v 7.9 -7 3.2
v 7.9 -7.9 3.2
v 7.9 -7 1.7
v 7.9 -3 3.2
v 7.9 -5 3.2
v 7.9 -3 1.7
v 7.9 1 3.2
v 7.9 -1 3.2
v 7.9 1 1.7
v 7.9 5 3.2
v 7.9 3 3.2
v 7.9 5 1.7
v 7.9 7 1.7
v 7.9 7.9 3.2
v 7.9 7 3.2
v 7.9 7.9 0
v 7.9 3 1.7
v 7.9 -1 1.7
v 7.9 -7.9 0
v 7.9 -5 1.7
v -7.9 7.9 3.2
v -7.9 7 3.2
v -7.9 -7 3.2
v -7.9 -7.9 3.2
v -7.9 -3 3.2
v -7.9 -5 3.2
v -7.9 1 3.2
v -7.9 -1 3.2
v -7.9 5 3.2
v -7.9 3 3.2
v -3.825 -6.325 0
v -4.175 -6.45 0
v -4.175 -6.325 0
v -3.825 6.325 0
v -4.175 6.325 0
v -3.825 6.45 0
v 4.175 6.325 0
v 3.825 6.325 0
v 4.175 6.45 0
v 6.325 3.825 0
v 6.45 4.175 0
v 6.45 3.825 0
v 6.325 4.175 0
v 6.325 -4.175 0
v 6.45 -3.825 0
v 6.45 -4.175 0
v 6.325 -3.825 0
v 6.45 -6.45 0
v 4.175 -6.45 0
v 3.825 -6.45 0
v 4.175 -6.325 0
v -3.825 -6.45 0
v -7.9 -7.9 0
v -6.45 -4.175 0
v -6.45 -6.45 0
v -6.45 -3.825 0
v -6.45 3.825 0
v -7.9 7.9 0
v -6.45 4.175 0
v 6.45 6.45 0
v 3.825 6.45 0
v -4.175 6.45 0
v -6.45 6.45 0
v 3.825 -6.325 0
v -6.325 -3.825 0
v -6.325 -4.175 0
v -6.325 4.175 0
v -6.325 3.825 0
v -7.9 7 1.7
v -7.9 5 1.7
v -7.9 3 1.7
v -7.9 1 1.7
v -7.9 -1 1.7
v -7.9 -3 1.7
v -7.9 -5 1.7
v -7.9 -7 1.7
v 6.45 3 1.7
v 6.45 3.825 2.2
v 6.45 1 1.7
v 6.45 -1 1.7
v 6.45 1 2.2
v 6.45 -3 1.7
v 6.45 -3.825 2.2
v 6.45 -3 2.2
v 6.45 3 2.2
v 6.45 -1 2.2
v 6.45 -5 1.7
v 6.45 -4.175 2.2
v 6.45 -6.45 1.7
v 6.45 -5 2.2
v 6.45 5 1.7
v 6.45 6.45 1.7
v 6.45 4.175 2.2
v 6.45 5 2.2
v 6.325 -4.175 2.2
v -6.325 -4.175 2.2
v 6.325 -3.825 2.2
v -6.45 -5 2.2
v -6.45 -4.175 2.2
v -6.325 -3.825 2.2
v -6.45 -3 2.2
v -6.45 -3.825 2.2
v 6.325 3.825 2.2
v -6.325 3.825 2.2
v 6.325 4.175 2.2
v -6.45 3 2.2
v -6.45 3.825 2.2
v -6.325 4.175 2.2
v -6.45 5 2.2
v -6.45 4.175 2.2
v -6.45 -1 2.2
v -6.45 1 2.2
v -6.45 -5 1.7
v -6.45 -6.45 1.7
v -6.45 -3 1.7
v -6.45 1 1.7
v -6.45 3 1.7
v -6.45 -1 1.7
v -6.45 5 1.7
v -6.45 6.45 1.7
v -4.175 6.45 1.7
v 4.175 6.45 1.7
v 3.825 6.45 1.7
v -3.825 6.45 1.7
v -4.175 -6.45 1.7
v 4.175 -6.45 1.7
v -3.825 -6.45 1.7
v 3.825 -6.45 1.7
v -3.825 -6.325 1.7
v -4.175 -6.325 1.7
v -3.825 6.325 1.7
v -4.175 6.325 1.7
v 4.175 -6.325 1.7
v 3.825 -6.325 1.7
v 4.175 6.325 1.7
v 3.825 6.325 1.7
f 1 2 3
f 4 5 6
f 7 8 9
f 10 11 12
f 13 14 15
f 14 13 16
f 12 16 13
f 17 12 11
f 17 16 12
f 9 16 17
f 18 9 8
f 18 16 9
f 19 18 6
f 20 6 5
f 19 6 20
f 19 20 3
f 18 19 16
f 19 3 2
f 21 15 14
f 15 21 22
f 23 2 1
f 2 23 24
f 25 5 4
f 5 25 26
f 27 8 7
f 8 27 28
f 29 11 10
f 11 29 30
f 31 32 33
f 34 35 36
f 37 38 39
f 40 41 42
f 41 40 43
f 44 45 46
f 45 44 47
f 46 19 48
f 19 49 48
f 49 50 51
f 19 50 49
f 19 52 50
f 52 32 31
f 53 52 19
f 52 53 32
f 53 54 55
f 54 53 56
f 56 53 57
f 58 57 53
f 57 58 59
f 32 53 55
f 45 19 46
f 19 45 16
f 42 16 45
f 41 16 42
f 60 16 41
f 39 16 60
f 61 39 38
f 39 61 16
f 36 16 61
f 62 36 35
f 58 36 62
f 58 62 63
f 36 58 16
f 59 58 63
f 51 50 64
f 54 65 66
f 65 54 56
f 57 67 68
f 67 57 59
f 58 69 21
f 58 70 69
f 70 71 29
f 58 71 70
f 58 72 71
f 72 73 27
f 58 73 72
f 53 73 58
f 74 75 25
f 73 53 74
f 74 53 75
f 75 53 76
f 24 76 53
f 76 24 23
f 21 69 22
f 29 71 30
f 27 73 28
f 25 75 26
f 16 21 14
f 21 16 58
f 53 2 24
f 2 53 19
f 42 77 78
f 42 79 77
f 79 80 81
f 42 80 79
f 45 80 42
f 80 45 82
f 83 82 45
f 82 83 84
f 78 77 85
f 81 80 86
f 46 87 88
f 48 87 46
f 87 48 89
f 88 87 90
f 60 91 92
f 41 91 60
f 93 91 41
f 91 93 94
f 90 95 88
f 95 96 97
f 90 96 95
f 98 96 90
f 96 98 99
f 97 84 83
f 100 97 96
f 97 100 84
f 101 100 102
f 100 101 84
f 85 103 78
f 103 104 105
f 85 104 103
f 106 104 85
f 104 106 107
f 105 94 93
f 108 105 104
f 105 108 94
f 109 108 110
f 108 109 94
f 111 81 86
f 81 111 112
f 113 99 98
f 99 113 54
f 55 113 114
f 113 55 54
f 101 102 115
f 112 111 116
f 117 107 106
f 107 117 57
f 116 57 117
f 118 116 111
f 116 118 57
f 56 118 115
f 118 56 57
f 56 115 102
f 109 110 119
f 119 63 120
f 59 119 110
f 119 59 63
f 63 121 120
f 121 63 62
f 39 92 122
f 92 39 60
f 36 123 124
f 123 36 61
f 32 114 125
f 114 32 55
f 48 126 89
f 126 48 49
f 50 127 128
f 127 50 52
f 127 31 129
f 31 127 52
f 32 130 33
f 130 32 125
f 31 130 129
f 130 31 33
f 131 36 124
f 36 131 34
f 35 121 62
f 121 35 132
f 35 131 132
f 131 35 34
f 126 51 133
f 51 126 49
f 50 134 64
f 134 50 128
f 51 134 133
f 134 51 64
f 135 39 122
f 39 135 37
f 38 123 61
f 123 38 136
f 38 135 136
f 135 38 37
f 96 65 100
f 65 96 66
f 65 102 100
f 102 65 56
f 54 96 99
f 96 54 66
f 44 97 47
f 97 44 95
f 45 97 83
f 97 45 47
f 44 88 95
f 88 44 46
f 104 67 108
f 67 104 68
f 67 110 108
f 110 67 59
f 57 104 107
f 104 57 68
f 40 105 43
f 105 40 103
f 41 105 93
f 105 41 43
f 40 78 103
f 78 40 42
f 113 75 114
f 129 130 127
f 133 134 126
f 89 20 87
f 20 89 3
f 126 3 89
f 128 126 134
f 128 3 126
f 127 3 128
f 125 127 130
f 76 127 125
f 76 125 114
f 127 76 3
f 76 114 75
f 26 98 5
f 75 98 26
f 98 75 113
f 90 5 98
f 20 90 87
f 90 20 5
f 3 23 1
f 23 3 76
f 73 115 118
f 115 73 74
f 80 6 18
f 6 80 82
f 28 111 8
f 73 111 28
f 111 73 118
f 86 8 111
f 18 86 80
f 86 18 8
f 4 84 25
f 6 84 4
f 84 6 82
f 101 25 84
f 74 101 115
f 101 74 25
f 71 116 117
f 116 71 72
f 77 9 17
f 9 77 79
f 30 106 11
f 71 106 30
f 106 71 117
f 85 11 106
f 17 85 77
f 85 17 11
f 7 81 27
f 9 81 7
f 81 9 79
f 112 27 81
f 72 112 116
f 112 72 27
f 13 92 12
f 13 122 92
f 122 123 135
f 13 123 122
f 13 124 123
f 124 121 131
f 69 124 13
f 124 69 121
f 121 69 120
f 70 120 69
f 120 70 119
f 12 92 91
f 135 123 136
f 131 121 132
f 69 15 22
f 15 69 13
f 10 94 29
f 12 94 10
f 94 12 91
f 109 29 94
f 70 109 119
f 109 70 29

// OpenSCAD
// file: globals.scad
// brick dependent parameters
brick_height = 9.6; // Height of the non-stud portion of a regular brick.
stud_spacing=8; // Distance between centers of studs.
stud_diameter=4.85; // Diameters of studs.
wall_play=0.1; // Amount of space removed from the outer edge of bricks so that they will fit next to each other.
roof_thickness=1;
wall_thickness=1.45;

post_wall_thickness = 0.85;
pin_diameter=3 ;
post_diameter=6.5;

hollow_stud_inner_diameter = 3.1;
stud_height = 1.8;

axle_spline_width = 2.0;
axle_diameter = 5 * 1;

$fn=50;

// printing depoendent parameters
STUD_SCALE_UP = 1.03;
STUD_SCALE_SIDE = 1.0;
STUD_SCALE_DOWN = 1.0;
SPLINE_SCALE_DOWN = 0.5;
SPLINE_SCALE_UP = 1.0;
SPLINE_SCALE_SIDE = 0.5;

module uncenter(width, length, height) {
    translate([((8 * length) / 2), ((8 * width) / 2), height ? ((8 * height) / 2) : 0]) children();
}

module center(width, length, height) {
    translate([-((8 * length) / 2), -((8 * width) / 2), height ? -((8 * height) / 2) : 0]) children();
}

module place(x, y, z=0) {
    translate([8 * y, 8 * x, z * 9.6]) children();
}
// main file
use <brick.scad>
include <globals.scad>

hole_width=2;
hole_offset=1;

module grid(width=2, length=2) {
        difference(){
            block(
                type="tile",
                width=width,
                length=length,
                height=1/3,
                spline_rescale=0.5
            );

            for (i=[0:(width*stud_spacing-hole_offset)/(2*hole_width)])
                translate([-length/2*stud_spacing,-width/2*stud_spacing+hole_offset+i*hole_width*2,1.7])
                    cube([length*stud_spacing,hole_width,1.5+0.001]);
        }
}

grid(2,2);
